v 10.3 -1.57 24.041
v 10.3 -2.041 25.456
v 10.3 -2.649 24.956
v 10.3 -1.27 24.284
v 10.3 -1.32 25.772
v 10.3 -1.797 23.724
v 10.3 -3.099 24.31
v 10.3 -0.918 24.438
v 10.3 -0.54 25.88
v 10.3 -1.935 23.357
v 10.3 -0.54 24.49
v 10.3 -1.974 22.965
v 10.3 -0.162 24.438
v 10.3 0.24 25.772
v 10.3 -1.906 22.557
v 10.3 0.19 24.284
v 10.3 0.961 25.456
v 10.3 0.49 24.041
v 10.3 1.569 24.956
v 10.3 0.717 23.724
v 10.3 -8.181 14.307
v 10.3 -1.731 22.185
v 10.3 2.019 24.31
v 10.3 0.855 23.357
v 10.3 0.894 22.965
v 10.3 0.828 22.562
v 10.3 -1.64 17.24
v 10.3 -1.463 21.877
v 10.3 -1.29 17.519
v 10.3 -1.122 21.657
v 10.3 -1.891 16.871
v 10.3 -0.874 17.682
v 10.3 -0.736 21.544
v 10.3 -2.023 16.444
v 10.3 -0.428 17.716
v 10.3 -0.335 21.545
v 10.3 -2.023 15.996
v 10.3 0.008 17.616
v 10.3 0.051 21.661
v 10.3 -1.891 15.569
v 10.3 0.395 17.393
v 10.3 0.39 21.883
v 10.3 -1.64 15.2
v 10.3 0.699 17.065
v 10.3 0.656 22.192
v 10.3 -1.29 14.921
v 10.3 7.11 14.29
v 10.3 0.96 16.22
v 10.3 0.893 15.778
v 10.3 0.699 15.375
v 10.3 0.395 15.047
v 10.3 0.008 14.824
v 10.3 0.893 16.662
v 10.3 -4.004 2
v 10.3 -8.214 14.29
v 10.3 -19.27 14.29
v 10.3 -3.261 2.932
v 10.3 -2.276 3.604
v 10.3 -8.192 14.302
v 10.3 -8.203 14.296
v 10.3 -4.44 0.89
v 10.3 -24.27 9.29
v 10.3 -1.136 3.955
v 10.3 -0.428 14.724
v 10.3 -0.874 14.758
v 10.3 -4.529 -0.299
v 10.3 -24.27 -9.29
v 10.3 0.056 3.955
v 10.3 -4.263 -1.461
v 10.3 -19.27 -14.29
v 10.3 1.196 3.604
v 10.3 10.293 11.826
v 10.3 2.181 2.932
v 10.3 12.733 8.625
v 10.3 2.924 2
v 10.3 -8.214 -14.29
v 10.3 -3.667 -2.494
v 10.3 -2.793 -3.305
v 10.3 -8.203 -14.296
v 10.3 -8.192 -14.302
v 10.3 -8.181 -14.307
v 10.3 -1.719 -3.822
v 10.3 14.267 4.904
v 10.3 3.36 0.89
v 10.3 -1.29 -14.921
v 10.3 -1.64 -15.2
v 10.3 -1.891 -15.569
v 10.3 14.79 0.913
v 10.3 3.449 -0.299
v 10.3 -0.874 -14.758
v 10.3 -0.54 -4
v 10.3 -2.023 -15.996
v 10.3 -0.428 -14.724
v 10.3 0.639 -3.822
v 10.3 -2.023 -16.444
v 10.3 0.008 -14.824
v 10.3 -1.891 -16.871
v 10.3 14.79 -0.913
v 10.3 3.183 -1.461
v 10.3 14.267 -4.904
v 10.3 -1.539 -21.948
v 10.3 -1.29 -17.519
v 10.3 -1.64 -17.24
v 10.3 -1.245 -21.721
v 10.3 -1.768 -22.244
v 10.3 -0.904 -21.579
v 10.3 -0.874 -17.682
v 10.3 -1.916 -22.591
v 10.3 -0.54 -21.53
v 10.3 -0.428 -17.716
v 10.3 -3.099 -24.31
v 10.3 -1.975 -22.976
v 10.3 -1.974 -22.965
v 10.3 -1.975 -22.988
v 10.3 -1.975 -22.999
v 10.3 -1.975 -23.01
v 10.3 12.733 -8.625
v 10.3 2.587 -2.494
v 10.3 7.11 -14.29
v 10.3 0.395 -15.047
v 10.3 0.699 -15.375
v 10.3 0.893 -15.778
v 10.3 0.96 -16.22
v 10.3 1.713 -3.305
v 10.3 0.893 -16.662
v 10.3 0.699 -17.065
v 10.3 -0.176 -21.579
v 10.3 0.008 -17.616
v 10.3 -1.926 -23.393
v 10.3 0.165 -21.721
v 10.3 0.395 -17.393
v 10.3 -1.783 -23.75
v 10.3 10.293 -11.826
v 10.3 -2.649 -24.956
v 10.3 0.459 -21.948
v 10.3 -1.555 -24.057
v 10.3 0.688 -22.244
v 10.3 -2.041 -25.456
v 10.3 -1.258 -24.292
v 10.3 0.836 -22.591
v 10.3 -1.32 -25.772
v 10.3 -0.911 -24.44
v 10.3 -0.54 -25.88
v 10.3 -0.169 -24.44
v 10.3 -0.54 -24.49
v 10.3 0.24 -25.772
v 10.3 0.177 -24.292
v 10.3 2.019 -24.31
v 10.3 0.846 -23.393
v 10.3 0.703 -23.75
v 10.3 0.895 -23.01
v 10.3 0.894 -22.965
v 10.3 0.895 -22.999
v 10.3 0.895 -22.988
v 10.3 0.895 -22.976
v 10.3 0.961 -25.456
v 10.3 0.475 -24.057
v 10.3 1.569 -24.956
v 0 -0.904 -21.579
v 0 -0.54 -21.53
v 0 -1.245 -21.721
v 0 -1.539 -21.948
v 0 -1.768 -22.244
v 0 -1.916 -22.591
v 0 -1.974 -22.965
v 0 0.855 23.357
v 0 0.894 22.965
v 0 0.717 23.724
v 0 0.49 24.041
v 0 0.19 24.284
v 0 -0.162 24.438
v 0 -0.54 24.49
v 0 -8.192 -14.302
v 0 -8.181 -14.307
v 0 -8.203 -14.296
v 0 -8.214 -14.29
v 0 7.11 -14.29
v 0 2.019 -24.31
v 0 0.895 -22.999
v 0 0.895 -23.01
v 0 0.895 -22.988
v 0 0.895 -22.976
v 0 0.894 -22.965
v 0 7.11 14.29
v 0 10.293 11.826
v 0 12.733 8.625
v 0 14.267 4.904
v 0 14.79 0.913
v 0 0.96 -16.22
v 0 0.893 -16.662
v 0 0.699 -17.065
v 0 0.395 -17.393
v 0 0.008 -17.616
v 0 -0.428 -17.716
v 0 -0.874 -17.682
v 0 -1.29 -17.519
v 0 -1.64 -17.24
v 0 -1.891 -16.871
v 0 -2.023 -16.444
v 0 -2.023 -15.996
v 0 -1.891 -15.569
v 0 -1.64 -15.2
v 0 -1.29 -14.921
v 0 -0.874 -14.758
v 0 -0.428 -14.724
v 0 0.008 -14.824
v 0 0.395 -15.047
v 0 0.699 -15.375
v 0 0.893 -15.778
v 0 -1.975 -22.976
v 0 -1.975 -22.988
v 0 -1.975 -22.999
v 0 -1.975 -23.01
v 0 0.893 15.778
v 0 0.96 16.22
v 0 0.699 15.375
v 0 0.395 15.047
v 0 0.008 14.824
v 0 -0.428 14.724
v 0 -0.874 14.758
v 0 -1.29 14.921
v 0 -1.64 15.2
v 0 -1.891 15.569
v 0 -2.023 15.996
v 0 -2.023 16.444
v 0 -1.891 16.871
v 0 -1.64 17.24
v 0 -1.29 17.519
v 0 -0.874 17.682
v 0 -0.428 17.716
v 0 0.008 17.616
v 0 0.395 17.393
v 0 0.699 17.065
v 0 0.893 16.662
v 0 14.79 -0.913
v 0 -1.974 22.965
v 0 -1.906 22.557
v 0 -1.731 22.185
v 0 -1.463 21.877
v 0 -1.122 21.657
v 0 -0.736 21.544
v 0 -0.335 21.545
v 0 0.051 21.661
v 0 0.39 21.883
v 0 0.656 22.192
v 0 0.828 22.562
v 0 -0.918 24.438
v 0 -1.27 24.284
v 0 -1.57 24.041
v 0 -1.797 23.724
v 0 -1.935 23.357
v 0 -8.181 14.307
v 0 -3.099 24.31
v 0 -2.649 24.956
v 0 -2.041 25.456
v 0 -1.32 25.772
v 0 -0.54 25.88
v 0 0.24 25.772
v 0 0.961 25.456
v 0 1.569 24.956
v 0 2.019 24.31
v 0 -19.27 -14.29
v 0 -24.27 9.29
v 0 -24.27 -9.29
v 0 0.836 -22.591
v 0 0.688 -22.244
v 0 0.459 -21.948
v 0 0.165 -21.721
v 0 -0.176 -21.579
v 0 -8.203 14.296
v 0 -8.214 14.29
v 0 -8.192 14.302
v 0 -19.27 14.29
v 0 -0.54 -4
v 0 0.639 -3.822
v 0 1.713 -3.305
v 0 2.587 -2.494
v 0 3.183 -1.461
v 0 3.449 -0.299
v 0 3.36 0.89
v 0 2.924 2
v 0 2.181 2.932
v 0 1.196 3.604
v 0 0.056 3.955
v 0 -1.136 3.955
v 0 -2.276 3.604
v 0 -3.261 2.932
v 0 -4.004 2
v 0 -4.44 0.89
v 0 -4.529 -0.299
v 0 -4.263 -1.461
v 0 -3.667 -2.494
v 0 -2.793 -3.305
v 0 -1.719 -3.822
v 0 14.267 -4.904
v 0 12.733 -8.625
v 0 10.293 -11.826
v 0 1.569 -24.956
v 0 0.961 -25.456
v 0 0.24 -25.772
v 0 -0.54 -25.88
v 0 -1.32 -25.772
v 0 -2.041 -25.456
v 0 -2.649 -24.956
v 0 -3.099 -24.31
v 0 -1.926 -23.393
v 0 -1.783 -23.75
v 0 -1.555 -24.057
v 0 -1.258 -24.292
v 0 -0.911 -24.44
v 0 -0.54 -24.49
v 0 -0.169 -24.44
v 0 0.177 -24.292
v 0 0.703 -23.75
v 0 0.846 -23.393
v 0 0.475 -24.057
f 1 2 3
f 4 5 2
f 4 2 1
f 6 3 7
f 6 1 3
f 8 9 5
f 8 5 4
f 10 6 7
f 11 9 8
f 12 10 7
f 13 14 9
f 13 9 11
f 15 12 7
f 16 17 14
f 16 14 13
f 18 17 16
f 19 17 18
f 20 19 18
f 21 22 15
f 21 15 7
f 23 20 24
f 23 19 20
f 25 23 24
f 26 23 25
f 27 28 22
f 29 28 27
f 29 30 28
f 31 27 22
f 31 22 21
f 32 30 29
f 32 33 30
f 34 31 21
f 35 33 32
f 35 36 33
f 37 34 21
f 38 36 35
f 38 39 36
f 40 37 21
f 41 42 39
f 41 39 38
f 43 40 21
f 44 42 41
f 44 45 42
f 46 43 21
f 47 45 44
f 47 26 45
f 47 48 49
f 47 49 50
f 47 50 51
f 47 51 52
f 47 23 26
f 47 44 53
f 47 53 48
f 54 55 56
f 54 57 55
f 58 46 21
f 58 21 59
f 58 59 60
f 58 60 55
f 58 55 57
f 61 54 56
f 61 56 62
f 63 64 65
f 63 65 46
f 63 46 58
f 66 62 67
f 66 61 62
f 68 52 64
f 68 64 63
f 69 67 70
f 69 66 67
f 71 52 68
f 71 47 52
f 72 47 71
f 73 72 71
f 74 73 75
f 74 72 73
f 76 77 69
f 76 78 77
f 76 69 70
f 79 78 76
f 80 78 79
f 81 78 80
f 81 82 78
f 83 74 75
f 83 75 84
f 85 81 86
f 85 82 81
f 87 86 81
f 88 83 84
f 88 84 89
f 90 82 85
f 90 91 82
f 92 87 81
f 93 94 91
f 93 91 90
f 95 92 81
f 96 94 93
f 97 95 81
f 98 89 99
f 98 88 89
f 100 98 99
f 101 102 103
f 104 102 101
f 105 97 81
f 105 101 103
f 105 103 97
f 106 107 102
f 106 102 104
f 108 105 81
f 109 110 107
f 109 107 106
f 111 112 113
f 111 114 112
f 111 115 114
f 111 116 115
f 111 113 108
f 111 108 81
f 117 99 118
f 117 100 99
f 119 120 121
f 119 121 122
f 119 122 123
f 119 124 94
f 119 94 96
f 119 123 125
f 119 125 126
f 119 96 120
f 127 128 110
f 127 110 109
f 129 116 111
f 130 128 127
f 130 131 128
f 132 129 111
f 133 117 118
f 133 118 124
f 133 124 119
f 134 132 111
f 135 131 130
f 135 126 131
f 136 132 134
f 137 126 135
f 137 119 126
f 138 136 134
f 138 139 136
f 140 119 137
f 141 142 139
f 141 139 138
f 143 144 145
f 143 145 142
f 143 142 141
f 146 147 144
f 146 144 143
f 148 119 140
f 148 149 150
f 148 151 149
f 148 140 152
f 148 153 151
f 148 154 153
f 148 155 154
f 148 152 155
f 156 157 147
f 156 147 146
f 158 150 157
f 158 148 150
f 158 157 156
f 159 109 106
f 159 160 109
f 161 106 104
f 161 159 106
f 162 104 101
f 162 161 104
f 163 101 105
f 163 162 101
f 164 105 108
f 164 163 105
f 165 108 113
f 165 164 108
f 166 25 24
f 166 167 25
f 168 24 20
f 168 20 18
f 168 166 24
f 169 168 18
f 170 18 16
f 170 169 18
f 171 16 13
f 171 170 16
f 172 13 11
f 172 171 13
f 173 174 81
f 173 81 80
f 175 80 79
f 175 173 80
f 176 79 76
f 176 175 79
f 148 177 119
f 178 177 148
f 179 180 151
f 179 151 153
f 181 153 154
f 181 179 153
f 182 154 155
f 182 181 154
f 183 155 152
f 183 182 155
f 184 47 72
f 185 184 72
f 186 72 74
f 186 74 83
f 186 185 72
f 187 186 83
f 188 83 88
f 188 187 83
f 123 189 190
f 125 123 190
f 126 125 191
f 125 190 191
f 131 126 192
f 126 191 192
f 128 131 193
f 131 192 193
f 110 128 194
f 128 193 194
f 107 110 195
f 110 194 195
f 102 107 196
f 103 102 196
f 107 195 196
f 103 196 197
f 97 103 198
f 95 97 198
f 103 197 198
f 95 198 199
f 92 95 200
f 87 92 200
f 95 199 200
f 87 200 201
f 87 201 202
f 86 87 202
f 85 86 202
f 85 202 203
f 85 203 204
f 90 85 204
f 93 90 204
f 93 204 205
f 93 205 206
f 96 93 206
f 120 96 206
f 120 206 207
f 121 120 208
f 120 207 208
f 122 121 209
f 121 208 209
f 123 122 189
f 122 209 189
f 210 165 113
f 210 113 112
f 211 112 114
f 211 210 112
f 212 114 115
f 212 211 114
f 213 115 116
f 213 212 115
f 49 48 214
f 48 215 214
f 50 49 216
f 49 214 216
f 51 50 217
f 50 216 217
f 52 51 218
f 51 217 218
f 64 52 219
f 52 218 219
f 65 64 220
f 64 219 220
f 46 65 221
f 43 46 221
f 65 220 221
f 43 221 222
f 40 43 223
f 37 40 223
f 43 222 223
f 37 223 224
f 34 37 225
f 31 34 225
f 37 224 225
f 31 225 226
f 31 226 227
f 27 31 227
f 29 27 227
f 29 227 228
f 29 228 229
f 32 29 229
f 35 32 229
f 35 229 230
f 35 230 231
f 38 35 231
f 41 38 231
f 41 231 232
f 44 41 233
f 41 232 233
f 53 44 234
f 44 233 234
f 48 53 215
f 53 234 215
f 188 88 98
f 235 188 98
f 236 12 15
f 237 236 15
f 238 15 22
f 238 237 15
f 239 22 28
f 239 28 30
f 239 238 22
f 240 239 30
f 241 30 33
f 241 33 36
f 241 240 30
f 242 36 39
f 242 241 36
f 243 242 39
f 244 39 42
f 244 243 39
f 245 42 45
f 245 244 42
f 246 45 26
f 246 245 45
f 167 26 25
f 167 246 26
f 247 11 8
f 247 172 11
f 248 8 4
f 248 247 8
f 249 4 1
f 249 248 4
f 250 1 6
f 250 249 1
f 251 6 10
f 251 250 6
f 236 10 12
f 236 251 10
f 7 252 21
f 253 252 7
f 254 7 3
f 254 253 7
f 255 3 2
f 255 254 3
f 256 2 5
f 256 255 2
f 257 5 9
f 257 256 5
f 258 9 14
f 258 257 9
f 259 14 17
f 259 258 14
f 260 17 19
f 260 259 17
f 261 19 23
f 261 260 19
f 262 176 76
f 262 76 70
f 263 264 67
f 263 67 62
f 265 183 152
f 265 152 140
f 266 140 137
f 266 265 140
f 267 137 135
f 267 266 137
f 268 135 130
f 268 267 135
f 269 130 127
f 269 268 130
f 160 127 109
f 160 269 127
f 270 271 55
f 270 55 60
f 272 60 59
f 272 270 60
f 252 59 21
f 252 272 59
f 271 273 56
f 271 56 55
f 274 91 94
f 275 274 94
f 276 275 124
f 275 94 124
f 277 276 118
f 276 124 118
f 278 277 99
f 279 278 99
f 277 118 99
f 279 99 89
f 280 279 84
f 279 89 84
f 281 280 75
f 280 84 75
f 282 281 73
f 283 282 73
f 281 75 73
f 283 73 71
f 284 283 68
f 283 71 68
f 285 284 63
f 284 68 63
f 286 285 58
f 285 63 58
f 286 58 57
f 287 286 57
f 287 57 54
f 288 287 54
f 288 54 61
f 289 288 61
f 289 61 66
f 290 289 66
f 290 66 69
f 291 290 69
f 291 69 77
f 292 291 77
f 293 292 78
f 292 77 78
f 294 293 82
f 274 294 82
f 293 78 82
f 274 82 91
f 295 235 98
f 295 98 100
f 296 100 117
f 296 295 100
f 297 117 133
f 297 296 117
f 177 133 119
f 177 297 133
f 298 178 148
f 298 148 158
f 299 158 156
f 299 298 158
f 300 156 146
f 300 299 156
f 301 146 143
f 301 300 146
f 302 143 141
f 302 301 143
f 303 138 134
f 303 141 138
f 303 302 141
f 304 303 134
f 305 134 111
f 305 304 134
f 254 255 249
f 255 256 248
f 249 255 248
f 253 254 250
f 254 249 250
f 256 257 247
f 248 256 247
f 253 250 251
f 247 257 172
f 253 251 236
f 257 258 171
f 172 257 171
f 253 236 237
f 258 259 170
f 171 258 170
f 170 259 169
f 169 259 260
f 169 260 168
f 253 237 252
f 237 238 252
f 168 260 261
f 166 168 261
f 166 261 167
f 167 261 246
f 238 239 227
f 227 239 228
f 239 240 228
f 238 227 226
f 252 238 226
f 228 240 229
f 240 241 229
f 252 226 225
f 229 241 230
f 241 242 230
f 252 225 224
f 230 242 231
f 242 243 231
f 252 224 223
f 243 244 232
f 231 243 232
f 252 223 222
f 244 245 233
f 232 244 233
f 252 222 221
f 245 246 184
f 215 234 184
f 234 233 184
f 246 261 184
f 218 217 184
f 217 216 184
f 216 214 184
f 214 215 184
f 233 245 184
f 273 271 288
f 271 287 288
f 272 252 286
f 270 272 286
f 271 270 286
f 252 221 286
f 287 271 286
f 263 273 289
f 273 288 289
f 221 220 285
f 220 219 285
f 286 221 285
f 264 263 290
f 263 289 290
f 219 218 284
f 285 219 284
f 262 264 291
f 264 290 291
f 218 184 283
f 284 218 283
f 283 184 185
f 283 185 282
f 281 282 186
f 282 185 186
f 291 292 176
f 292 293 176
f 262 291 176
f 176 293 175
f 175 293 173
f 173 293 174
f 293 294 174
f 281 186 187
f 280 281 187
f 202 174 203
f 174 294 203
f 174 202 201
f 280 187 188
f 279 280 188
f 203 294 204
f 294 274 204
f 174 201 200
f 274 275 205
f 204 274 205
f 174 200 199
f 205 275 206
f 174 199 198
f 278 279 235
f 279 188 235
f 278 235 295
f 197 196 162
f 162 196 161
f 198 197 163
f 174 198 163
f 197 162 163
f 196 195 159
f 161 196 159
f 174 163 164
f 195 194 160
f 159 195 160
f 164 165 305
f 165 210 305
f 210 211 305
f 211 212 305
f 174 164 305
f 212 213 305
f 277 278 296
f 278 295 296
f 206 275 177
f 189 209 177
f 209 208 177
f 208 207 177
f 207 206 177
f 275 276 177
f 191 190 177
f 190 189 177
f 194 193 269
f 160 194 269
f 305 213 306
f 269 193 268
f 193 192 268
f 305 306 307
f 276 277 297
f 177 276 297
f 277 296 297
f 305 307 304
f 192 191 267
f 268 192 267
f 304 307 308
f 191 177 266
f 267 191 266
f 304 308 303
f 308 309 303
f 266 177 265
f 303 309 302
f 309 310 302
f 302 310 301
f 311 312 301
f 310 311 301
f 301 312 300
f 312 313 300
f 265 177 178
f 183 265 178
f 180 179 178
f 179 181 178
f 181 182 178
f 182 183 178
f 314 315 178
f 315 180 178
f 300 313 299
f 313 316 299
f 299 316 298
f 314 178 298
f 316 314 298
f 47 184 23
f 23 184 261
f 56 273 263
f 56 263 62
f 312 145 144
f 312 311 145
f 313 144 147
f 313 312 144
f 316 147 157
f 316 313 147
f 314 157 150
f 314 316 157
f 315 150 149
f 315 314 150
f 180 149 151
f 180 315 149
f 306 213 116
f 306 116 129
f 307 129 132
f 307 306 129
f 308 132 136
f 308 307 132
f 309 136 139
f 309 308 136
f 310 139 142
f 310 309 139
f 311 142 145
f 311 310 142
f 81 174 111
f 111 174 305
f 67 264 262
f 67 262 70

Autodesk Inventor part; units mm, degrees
ref_plane "YZ Plane" through (0, 0, 0) normal (1, 0, 0) x (0, 1, 0)
ref_plane "XZ Plane" through (0, 0, 0) normal (0, 1, 0) x (-1, 0, 0)
ref_plane "XY Plane" through (0, 0, 0) normal (0, 0, 1) x (1, 0, 0)
sketch "Sketch1" plane through (0, 0, 0) normal (1, 0, 0) x (0, 1, 0)
  line L0 (-0.54, 0) -> (-0.54, -14.29)
  circle A0 centre (-0.54, 0) radius 7.65
  line L1 (-0.54, -14.29) -> (14.79, -14.29)
  line L2 (14.79, -14.29) -> (-24.27, -14.29)
  line L3 (-24.27, -14.29) -> (-24.27, 14.29)
  line L4 (-24.27, 14.29) -> (14.79, 14.29)
  line L5 (14.79, 14.29) -> (14.79, -14.29)
  circle A1 centre (-0.54, 0) radius 16.22
  circle A2 centre (-0.54, 0) radius 23.01
  line L6 (-0.54, 0) -> (-0.54, -23.01)
  line L7 (-0.54, -23.01) -> (-0.54, -24.49)
  line L8 (-0.54, -23.01) -> (0.895, -23.01)
  ellipse E0 centre (-0.54, -23.01) end of major axis (-0.54, -24.49) minor radius 1.435
  circle A3 centre (-0.54, -16.22) radius 1.5
  line L9 (-8.19, 0) -> (-16.76, 0)
  line L10 (-8.19, 0) -> (-8.19, -14.29)
  line L11 (-0.54, -23.01) -> (-3.41, -23.01)
  circle A4 centre (-0.54, -23.01) radius 2.87
  line L12 (-8.19, -14.29) -> (-3.0986, -24.3101)
  line L13 (7.11, -14.29) -> (2.0186, -24.3101)
  ellipse E1 centre (-0.54, 23.01) end of major axis (-0.54, 24.49) minor radius 1.435
  circle A5 centre (-0.54, 16.22) radius 1.5
  circle A6 centre (-0.54, 23.01) radius 2.87
  line L14 (-8.19, 14.29) -> (-3.0986, 24.3101)
  line L15 (7.11, 14.29) -> (2.0186, 24.3101)
  point P0 (-3.4044, -22.831)
  point P1 (-1.9743, -22.9653)
  point P2 (-1.975, -23.01)
  point P3 (-8.1812, -14.3074)
  point P4 (-8.1812, 14.3074)
  point P5 (-8.2136, 14.29)
  point P6 (-8.2136, -14.29)
  dimension "d13" = 15.3
  dimension "d18" = 46.02
  dimension "d12" = 14.29
  dimension "d14" = 15.33
  dimension "d15" = 39.06
  dimension "d16" = 28.58
  dimension "d17" = 32.44
  dimension "d19" = 1.48
  dimension "d20" = 1.435
  dimension "d21" = 3
  dimension "d22" = 2.87
extrude "Extrusion1" add sketch "Sketch1" along normal blind 10.3 contours A0 L9 A1 L4 L5 L1 L0 | L0 L2 L10 A0 | L6 A3 A1 L12 L2 | L1 L13 A1 A3 L6 | L10 L2 A1 L9 | L12 A1 L2 | A1 L2 A2 L4 | A1 L5 L1 | L13 A2 A4 L6 A3 A1 | A1 A3 L6 A4 A2 L12 | A1 L14 L4 | L13 A4 A2 | L2 L3 L4 A2 | A2 A4 L12 | L14 A1 A5 L15 L4 | L14 A2 A6 L15 A1 A5 | A1 L4 L5 | A4 L11 E0 A2 | A2 E0 L6 A4 | A4 L6 E0 A2 | A2 E0 L11 A4 | L14 A6 A2 | A2 A6 L15 | A6 A2 E1 | A2 E1 A6
fillet "Fillet1" radius 15.49 2 edges at (5.15, 14.79, -14.29) (5.15, 14.79, 14.29)
chamfer "Chamfer1" distance 5 angle 45 2 edges at (5.15, -24.27, -14.29) (5.15, -24.27, 14.29)
sketch "Sketch2" plane through (10.3, 0, 0) normal (1, 0, 0) x (0, 0, -1)
  circle A0 centre (0, -0.54) radius 7.65 projected
  line L0 (0, -0.54) -> (7.65, -0.54)
  circle A1 centre (0, -0.54) radius 4
  circle A2 centre (0, -0.54) radius 7.65
  point P0 (0, 0)
  dimension "d29" = 8
extrude "8mm_inlet" add sketch "Sketch2" against normal up to surface (10.3 mm away)
properties part number "AMT102-0512-I5000-5"
